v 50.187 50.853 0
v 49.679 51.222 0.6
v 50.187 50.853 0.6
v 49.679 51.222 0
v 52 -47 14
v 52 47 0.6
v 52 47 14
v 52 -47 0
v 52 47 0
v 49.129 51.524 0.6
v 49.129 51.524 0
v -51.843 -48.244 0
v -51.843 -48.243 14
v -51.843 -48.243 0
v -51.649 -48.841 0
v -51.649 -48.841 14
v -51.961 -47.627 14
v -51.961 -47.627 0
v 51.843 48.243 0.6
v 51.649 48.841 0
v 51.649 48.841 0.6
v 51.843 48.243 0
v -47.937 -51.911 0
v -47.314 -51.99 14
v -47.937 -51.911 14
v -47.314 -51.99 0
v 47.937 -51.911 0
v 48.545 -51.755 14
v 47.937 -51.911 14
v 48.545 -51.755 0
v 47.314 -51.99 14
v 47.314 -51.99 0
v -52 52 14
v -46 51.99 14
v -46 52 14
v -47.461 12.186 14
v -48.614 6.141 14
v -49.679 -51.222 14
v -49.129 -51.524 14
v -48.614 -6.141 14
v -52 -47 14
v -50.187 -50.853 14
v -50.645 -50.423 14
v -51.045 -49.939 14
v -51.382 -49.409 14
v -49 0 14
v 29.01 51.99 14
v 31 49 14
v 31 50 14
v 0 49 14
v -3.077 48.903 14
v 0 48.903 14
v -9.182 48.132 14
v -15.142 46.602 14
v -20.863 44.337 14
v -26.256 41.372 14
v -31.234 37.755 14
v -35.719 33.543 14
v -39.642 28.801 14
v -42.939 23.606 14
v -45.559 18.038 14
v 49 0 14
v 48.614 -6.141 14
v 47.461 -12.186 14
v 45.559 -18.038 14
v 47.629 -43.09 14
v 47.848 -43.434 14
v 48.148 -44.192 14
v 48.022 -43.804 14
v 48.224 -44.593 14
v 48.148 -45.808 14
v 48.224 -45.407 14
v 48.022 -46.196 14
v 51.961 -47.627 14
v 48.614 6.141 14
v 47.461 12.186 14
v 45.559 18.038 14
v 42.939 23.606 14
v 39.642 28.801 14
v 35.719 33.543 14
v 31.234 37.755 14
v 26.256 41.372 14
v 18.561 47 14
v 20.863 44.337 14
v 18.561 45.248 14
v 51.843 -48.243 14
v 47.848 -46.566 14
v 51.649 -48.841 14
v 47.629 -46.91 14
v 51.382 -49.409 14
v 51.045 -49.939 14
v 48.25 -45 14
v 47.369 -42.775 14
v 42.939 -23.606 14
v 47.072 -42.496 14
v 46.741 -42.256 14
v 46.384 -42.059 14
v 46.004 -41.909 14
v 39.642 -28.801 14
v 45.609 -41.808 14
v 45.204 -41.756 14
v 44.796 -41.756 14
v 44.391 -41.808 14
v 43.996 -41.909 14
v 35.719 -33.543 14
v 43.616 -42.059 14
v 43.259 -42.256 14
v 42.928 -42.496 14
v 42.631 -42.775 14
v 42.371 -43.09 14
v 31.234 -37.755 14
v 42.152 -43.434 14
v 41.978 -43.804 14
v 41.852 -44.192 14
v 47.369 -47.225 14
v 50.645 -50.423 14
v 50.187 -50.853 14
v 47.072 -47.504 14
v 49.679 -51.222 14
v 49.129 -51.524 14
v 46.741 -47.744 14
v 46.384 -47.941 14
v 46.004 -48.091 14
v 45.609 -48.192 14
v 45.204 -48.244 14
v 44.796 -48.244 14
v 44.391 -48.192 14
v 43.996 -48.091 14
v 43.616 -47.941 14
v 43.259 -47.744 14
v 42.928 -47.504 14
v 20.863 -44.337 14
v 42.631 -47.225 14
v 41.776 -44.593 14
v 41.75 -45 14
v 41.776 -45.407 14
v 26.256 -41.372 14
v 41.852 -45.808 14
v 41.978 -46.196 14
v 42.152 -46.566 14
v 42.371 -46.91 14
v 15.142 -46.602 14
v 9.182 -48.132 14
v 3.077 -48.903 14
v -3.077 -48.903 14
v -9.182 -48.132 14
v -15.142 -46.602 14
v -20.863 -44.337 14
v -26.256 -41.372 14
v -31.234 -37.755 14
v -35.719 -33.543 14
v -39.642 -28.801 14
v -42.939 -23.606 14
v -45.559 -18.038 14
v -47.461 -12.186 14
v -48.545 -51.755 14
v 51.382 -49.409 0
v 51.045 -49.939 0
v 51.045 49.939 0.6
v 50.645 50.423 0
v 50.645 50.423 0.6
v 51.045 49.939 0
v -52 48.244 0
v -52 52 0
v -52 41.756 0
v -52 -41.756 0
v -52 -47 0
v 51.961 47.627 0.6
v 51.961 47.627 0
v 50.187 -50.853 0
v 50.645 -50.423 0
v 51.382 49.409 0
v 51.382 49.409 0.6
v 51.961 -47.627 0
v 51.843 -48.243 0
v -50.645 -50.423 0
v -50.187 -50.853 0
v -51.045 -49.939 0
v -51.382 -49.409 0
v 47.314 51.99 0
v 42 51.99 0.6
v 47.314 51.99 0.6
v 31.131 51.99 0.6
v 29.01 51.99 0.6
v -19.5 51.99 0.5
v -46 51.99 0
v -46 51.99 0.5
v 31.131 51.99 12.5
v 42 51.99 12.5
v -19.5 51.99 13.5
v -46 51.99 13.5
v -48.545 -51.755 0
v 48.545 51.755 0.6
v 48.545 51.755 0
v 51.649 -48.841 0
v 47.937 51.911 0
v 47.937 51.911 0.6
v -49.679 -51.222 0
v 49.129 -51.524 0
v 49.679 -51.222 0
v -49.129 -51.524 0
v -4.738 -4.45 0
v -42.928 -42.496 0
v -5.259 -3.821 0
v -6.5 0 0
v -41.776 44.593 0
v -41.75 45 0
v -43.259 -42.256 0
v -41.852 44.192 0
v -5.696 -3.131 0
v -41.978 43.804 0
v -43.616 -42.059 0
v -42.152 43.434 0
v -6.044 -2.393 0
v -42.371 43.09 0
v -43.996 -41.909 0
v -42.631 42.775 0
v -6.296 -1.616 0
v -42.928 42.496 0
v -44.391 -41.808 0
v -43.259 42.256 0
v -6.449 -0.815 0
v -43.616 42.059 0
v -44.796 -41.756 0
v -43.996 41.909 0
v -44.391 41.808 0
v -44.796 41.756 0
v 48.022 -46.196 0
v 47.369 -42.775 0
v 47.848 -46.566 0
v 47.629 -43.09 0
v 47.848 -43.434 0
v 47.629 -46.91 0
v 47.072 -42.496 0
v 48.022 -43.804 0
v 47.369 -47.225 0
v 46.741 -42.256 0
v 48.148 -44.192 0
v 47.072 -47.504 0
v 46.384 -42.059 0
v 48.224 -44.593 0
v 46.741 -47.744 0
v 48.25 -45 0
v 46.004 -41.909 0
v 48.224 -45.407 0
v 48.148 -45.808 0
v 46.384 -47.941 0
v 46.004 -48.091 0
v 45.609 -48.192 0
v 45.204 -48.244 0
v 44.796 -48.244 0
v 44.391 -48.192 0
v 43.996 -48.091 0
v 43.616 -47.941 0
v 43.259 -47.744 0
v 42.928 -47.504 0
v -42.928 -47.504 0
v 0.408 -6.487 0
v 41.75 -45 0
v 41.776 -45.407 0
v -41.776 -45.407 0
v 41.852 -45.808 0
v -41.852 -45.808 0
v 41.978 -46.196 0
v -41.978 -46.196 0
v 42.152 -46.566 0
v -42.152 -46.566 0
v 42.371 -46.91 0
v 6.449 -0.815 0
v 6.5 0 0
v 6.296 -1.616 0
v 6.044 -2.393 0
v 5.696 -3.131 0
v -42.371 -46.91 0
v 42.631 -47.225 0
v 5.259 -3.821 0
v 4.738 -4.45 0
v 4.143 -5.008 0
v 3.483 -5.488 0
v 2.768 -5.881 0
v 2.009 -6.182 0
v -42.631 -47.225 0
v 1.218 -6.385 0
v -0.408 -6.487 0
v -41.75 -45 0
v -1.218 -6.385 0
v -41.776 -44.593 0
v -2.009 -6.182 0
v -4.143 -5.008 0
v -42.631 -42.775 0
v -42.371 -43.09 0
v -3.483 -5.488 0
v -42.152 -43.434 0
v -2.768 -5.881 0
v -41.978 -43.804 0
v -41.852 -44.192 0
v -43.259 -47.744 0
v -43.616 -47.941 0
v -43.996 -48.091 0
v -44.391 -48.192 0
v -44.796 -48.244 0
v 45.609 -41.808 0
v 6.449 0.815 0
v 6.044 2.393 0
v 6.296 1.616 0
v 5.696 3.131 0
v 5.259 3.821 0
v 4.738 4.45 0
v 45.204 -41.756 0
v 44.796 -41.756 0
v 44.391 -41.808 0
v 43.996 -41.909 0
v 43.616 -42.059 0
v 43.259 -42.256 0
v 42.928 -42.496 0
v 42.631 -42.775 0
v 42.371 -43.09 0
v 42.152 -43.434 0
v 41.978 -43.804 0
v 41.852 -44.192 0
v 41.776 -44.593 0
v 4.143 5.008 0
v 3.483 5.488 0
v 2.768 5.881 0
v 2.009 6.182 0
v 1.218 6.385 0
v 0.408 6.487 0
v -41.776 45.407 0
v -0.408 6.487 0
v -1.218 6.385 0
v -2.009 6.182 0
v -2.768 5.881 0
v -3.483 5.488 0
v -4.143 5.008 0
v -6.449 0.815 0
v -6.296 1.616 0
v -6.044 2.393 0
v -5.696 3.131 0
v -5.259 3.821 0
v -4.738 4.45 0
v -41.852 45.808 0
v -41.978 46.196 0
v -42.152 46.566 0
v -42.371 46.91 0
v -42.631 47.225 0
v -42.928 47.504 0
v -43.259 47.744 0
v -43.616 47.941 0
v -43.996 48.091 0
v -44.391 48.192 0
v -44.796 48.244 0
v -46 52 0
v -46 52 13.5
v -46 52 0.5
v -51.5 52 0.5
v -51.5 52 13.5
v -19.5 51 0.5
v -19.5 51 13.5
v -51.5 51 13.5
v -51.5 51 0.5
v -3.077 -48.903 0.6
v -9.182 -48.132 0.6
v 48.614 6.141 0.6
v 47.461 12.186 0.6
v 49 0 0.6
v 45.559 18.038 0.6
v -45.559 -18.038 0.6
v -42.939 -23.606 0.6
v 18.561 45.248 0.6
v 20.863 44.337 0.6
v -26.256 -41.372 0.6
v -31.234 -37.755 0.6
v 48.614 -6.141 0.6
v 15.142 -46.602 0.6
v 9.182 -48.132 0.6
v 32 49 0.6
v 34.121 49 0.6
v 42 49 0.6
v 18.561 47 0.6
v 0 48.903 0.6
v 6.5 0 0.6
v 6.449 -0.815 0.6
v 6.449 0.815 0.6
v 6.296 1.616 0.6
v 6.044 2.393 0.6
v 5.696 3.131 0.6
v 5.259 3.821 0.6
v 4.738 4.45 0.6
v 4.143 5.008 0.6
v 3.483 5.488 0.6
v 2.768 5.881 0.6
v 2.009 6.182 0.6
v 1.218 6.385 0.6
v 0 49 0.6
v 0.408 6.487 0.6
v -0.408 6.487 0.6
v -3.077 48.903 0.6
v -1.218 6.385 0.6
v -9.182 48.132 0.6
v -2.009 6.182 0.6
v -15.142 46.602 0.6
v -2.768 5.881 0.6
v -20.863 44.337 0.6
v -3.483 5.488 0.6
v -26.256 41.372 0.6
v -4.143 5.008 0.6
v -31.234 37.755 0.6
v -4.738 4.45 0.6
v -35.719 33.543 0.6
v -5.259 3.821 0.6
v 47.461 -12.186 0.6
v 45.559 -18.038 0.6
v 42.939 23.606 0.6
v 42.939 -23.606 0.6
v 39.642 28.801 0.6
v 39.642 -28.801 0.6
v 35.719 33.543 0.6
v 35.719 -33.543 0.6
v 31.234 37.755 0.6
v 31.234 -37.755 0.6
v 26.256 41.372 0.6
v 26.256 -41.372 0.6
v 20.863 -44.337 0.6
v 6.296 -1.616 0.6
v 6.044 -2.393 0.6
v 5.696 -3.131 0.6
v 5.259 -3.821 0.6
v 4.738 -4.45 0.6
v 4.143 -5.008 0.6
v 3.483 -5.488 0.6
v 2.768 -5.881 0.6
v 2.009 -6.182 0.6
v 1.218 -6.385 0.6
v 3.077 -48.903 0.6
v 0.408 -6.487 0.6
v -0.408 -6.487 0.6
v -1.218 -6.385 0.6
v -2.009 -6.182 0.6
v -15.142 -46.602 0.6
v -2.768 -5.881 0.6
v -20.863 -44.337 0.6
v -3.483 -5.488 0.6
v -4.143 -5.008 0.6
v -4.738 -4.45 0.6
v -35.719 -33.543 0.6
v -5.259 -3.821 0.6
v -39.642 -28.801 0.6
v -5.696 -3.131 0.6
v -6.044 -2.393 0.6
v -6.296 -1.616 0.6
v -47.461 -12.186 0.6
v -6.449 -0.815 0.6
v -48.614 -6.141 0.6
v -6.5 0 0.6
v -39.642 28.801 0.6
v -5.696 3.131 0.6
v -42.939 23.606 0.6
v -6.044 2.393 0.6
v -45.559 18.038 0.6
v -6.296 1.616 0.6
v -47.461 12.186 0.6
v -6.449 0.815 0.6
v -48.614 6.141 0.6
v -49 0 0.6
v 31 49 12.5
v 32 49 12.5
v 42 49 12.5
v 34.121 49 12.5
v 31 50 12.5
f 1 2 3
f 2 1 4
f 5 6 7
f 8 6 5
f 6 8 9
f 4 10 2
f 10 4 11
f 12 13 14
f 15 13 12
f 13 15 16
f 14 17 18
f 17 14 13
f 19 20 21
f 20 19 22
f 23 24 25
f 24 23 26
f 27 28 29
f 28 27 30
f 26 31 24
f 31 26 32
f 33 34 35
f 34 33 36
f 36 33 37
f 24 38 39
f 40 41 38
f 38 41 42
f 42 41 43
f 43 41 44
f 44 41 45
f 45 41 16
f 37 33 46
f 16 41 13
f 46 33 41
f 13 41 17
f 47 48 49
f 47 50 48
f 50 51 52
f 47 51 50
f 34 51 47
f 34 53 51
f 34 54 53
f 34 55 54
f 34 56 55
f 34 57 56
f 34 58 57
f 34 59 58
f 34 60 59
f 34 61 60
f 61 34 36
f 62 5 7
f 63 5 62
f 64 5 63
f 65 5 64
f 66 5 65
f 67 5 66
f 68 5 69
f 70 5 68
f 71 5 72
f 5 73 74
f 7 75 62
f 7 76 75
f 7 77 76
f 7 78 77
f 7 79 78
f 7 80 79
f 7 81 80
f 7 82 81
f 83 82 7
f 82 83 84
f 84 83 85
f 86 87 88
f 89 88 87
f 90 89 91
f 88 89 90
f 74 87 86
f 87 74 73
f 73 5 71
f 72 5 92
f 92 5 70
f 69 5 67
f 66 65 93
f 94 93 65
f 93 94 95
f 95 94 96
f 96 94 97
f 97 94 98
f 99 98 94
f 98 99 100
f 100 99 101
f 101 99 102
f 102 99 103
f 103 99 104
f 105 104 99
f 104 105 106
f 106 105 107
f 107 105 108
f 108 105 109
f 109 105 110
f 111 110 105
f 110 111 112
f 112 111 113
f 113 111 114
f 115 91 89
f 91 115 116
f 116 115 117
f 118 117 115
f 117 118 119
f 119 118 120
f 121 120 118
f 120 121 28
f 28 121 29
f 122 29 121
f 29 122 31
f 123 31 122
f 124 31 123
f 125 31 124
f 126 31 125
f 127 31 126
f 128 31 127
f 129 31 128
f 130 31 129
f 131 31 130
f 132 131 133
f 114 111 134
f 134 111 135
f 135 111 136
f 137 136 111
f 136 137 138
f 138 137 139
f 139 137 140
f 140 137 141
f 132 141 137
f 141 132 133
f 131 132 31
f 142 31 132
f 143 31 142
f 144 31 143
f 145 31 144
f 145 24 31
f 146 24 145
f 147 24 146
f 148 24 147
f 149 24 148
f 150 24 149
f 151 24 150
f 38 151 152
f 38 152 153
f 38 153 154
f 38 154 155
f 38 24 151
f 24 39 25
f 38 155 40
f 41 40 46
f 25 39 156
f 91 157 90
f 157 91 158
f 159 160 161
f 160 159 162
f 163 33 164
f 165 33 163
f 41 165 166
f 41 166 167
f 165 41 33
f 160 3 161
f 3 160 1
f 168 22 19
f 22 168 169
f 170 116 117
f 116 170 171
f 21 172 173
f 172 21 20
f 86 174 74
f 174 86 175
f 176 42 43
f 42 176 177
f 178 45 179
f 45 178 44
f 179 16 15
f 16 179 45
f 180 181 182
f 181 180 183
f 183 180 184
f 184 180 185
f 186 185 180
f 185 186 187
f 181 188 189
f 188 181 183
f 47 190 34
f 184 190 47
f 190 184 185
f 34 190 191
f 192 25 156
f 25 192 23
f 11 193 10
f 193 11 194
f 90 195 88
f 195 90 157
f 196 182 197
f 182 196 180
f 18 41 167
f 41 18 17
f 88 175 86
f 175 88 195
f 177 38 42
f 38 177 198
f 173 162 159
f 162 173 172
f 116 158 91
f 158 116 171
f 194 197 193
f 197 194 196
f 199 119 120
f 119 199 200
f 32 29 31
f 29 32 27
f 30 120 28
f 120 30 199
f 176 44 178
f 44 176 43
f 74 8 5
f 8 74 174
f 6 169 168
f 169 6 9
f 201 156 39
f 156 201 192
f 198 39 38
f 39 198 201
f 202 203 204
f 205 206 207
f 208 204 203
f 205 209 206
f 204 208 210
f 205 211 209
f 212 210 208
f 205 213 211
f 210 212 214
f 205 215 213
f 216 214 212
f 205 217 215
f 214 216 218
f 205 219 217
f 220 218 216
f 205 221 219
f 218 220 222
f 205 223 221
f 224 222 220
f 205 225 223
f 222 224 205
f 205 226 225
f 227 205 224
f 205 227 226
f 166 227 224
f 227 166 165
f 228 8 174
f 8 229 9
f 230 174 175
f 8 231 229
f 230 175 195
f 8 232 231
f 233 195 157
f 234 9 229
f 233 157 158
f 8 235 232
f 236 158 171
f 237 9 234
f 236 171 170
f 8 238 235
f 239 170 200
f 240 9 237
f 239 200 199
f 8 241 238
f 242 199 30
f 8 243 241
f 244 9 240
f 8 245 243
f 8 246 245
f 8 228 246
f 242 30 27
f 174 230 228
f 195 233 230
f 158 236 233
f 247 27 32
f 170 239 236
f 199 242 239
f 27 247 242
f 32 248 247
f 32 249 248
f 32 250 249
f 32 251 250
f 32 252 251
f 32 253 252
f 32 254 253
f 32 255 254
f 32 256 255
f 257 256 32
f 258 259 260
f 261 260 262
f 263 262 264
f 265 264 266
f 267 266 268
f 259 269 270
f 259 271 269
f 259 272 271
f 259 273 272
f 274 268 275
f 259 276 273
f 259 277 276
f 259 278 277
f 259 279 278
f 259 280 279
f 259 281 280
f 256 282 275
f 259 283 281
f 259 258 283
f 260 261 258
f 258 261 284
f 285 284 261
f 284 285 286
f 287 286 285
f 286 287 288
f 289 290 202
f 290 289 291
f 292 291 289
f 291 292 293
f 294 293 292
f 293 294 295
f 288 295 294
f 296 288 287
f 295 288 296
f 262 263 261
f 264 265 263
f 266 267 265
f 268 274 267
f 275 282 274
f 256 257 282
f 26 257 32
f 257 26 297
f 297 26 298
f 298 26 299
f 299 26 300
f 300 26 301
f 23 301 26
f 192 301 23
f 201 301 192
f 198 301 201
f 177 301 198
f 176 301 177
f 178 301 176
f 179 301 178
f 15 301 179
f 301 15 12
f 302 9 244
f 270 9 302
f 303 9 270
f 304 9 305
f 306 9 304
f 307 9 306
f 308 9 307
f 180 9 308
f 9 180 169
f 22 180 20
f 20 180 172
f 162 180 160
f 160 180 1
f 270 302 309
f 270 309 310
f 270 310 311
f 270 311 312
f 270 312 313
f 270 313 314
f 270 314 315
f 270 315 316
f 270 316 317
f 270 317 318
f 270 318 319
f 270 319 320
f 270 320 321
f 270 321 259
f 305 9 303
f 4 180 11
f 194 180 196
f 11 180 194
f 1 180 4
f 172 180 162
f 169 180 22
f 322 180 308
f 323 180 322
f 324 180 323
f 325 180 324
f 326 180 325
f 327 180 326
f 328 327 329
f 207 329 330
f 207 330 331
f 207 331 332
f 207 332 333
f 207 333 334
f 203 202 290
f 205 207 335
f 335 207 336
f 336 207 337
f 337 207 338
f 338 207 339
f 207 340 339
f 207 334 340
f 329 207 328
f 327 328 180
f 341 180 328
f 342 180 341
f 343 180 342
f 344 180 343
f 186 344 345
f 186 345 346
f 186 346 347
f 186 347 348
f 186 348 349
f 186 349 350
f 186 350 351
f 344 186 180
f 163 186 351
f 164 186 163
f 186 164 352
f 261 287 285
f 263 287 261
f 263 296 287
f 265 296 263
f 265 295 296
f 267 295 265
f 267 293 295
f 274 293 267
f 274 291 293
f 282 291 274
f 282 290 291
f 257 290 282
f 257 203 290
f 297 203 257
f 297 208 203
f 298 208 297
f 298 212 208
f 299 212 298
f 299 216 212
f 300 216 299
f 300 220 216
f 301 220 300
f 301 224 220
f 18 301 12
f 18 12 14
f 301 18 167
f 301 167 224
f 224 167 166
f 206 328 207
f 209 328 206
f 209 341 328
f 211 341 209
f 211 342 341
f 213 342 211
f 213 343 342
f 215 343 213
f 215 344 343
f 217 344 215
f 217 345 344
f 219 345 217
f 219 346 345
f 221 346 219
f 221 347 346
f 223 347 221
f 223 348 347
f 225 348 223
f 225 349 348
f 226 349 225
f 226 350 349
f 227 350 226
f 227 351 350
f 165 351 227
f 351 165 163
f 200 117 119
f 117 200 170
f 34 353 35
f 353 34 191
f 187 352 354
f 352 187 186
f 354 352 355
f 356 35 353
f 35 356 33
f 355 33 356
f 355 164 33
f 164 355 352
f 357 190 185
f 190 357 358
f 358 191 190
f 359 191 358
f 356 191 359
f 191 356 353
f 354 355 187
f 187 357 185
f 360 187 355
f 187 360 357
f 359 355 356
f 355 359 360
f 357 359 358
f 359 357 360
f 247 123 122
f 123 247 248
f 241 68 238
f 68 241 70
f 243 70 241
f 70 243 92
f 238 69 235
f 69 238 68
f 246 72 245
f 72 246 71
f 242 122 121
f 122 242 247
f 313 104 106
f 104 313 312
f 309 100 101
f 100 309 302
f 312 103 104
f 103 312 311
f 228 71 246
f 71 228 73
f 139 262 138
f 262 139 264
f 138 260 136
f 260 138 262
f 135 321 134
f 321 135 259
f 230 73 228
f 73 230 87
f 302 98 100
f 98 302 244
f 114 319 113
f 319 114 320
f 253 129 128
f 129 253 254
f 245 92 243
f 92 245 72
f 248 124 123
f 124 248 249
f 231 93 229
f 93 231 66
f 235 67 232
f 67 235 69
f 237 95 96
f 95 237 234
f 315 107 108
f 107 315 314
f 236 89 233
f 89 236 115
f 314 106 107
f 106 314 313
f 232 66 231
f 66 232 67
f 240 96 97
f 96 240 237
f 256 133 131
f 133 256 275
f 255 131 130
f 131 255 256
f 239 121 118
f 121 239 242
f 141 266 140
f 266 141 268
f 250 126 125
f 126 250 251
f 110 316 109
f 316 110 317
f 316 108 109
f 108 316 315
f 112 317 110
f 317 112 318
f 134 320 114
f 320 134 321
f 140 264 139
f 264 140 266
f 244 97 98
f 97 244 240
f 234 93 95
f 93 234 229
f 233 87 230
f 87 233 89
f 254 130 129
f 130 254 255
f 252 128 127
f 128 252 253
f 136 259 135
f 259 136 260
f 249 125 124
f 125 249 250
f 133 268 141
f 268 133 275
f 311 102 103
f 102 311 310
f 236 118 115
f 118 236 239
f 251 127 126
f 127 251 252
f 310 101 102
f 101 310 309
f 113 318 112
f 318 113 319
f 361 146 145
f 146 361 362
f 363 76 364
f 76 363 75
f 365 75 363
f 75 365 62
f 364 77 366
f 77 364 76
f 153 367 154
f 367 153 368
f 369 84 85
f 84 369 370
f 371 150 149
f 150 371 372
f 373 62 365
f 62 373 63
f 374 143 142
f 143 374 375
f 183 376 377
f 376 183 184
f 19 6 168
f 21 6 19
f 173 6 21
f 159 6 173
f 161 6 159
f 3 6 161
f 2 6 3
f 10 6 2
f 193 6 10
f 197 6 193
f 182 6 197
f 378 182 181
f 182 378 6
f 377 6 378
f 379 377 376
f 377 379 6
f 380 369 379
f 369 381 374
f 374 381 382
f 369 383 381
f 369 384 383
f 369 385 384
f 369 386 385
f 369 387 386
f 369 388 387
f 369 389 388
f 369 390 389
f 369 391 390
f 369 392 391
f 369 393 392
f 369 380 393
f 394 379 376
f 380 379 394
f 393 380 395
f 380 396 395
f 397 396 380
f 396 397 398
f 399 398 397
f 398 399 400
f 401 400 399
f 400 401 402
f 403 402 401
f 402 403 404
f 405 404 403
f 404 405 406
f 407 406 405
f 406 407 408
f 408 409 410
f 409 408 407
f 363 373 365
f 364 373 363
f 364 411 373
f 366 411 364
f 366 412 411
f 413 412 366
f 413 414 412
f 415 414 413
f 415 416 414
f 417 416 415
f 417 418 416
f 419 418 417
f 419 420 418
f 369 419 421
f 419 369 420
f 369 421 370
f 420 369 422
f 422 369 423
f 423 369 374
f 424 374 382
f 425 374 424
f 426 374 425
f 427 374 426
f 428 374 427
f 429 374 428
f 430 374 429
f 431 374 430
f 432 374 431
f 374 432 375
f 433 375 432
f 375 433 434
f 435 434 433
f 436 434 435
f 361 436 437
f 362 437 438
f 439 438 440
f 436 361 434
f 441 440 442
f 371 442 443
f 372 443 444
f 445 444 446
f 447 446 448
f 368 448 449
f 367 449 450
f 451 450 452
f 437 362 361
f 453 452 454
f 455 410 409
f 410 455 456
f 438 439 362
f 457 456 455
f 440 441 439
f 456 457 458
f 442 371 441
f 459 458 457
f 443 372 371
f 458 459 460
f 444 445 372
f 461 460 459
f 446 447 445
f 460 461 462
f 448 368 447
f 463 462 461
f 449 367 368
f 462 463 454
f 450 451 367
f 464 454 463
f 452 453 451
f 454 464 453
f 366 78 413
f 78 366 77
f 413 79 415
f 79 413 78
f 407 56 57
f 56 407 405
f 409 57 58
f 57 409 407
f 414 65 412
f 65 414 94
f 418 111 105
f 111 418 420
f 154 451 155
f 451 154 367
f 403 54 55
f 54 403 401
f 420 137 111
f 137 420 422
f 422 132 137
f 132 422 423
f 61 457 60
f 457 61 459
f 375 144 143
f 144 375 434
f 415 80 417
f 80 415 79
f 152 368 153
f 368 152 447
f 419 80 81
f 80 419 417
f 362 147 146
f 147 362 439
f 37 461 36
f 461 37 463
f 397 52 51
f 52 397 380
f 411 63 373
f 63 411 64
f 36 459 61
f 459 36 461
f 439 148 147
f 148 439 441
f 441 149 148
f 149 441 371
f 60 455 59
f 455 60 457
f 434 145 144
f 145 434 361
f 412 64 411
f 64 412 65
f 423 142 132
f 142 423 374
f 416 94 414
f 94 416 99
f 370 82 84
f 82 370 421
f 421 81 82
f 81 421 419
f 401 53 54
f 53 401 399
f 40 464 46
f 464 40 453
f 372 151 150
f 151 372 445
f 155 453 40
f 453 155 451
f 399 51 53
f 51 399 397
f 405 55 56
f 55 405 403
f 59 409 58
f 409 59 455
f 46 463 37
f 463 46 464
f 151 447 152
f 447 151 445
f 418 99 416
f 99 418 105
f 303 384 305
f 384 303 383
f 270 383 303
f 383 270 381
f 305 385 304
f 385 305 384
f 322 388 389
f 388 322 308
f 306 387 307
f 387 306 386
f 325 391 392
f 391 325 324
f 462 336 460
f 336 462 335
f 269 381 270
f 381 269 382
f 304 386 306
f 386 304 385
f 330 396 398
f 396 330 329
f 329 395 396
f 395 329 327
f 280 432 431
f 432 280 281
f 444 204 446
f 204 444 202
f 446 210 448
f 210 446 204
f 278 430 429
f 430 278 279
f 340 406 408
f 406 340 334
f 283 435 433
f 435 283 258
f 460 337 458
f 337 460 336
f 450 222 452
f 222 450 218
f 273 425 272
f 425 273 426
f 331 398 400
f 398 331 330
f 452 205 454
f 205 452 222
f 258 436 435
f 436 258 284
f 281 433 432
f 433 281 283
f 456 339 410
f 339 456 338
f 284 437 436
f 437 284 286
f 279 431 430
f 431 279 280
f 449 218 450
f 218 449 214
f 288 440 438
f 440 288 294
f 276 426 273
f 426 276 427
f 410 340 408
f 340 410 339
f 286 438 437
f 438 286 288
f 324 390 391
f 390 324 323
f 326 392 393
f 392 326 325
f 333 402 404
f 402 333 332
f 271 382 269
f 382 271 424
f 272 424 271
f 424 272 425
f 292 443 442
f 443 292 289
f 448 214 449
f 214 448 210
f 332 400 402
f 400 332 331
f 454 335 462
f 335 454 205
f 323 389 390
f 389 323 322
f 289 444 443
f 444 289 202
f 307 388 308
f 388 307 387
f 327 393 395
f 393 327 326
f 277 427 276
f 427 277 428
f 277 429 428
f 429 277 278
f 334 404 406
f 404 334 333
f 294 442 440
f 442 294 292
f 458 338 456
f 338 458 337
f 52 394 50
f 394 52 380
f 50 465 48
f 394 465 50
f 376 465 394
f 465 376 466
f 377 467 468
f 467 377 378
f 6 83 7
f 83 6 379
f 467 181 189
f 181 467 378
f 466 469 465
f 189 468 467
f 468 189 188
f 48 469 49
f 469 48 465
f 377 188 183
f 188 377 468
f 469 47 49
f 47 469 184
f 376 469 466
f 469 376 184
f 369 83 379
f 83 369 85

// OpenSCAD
$fn = 50;


difference() {
	union() {
		hull() {
			translate(v = [-47.0000000000, 47.0000000000, 0]) {
				cylinder(h = 14, r = 5);
			}
			translate(v = [47.0000000000, 47.0000000000, 0]) {
				cylinder(h = 14, r = 5);
			}
			translate(v = [-47.0000000000, -47.0000000000, 0]) {
				cylinder(h = 14, r = 5);
			}
			translate(v = [47.0000000000, -47.0000000000, 0]) {
				cylinder(h = 14, r = 5);
			}
		}
		translate(v = [-52.0000000000, 46.0000000000, 0]) {
			cube(size = [6, 6, 14]);
		}
	}
	union() {
		translate(v = [-52.5000000000, -45.0000000000, -250.0000000000]) {
			rotate(a = [0, 0, 0]) {
				difference() {
					union() {
						hull() {
							translate(v = [7.5000000000, 0, 0]) {
								cylinder(h = 250, r = 3.2500000000, r1 = 3.2500000000, r2 = 3.2500000000);
							}
							translate(v = [-7.5000000000, 0, 0]) {
								cylinder(h = 250, r = 3.2500000000, r1 = 3.2500000000, r2 = 3.2500000000);
							}
						}
					}
					union();
				}
			}
		}
		translate(v = [-52.5000000000, 45.0000000000, -250.0000000000]) {
			rotate(a = [0, 0, 0]) {
				difference() {
					union() {
						hull() {
							translate(v = [7.5000000000, 0, 0]) {
								cylinder(h = 250, r = 3.2500000000, r1 = 3.2500000000, r2 = 3.2500000000);
							}
							translate(v = [-7.5000000000, 0, 0]) {
								cylinder(h = 250, r = 3.2500000000, r1 = 3.2500000000, r2 = 3.2500000000);
							}
						}
					}
					union();
				}
			}
		}
		translate(v = [-51.5000000000, 51.0000000000, 0.5000000000]) {
			cube(size = [32, 1, 13.0000000000]);
		}
		translate(v = [45.0000000000, -45.0000000000, -50.0000000000]) {
			cylinder(h = 100, r = 3.2500000000);
		}
		translate(v = [0, 0, 0.6000000000]) {
			cylinder(h = 16.4000000000, r = 49.0000000000);
		}
		translate(v = [0, 0, -7.0000000000]) {
			cylinder(h = 14, r = 6.5000000000);
		}
		translate(v = [0.0000000000, 47.0000000000, 0.6000000000]) {
			cube(size = [52.0000000000, 2, 16.4000000000]);
		}
		translate(v = [42.0000000000, 47.0000000000, 0.6000000000]) {
			cube(size = [10, 5, 16.4000000000]);
		}
		translate(v = [31.0000000000, 47.0000000000, 12.5000000000]) {
			cube(size = [21, 5, 1.5000000000]);
		}
		translate(v = [28.2500000000, 52.7500000000, 0.6000000000]) {
			rotate(a = [0, 0, -45]) {
				cube(size = [7.5000000000, 1.5000000000, 16.4000000000]);
			}
		}
		translate(v = [11.0610000000, 45.0000000000, 0.6000000000]) {
			cube(size = [7.5000000000, 2, 13.4000000000]);
		}
	}
}
